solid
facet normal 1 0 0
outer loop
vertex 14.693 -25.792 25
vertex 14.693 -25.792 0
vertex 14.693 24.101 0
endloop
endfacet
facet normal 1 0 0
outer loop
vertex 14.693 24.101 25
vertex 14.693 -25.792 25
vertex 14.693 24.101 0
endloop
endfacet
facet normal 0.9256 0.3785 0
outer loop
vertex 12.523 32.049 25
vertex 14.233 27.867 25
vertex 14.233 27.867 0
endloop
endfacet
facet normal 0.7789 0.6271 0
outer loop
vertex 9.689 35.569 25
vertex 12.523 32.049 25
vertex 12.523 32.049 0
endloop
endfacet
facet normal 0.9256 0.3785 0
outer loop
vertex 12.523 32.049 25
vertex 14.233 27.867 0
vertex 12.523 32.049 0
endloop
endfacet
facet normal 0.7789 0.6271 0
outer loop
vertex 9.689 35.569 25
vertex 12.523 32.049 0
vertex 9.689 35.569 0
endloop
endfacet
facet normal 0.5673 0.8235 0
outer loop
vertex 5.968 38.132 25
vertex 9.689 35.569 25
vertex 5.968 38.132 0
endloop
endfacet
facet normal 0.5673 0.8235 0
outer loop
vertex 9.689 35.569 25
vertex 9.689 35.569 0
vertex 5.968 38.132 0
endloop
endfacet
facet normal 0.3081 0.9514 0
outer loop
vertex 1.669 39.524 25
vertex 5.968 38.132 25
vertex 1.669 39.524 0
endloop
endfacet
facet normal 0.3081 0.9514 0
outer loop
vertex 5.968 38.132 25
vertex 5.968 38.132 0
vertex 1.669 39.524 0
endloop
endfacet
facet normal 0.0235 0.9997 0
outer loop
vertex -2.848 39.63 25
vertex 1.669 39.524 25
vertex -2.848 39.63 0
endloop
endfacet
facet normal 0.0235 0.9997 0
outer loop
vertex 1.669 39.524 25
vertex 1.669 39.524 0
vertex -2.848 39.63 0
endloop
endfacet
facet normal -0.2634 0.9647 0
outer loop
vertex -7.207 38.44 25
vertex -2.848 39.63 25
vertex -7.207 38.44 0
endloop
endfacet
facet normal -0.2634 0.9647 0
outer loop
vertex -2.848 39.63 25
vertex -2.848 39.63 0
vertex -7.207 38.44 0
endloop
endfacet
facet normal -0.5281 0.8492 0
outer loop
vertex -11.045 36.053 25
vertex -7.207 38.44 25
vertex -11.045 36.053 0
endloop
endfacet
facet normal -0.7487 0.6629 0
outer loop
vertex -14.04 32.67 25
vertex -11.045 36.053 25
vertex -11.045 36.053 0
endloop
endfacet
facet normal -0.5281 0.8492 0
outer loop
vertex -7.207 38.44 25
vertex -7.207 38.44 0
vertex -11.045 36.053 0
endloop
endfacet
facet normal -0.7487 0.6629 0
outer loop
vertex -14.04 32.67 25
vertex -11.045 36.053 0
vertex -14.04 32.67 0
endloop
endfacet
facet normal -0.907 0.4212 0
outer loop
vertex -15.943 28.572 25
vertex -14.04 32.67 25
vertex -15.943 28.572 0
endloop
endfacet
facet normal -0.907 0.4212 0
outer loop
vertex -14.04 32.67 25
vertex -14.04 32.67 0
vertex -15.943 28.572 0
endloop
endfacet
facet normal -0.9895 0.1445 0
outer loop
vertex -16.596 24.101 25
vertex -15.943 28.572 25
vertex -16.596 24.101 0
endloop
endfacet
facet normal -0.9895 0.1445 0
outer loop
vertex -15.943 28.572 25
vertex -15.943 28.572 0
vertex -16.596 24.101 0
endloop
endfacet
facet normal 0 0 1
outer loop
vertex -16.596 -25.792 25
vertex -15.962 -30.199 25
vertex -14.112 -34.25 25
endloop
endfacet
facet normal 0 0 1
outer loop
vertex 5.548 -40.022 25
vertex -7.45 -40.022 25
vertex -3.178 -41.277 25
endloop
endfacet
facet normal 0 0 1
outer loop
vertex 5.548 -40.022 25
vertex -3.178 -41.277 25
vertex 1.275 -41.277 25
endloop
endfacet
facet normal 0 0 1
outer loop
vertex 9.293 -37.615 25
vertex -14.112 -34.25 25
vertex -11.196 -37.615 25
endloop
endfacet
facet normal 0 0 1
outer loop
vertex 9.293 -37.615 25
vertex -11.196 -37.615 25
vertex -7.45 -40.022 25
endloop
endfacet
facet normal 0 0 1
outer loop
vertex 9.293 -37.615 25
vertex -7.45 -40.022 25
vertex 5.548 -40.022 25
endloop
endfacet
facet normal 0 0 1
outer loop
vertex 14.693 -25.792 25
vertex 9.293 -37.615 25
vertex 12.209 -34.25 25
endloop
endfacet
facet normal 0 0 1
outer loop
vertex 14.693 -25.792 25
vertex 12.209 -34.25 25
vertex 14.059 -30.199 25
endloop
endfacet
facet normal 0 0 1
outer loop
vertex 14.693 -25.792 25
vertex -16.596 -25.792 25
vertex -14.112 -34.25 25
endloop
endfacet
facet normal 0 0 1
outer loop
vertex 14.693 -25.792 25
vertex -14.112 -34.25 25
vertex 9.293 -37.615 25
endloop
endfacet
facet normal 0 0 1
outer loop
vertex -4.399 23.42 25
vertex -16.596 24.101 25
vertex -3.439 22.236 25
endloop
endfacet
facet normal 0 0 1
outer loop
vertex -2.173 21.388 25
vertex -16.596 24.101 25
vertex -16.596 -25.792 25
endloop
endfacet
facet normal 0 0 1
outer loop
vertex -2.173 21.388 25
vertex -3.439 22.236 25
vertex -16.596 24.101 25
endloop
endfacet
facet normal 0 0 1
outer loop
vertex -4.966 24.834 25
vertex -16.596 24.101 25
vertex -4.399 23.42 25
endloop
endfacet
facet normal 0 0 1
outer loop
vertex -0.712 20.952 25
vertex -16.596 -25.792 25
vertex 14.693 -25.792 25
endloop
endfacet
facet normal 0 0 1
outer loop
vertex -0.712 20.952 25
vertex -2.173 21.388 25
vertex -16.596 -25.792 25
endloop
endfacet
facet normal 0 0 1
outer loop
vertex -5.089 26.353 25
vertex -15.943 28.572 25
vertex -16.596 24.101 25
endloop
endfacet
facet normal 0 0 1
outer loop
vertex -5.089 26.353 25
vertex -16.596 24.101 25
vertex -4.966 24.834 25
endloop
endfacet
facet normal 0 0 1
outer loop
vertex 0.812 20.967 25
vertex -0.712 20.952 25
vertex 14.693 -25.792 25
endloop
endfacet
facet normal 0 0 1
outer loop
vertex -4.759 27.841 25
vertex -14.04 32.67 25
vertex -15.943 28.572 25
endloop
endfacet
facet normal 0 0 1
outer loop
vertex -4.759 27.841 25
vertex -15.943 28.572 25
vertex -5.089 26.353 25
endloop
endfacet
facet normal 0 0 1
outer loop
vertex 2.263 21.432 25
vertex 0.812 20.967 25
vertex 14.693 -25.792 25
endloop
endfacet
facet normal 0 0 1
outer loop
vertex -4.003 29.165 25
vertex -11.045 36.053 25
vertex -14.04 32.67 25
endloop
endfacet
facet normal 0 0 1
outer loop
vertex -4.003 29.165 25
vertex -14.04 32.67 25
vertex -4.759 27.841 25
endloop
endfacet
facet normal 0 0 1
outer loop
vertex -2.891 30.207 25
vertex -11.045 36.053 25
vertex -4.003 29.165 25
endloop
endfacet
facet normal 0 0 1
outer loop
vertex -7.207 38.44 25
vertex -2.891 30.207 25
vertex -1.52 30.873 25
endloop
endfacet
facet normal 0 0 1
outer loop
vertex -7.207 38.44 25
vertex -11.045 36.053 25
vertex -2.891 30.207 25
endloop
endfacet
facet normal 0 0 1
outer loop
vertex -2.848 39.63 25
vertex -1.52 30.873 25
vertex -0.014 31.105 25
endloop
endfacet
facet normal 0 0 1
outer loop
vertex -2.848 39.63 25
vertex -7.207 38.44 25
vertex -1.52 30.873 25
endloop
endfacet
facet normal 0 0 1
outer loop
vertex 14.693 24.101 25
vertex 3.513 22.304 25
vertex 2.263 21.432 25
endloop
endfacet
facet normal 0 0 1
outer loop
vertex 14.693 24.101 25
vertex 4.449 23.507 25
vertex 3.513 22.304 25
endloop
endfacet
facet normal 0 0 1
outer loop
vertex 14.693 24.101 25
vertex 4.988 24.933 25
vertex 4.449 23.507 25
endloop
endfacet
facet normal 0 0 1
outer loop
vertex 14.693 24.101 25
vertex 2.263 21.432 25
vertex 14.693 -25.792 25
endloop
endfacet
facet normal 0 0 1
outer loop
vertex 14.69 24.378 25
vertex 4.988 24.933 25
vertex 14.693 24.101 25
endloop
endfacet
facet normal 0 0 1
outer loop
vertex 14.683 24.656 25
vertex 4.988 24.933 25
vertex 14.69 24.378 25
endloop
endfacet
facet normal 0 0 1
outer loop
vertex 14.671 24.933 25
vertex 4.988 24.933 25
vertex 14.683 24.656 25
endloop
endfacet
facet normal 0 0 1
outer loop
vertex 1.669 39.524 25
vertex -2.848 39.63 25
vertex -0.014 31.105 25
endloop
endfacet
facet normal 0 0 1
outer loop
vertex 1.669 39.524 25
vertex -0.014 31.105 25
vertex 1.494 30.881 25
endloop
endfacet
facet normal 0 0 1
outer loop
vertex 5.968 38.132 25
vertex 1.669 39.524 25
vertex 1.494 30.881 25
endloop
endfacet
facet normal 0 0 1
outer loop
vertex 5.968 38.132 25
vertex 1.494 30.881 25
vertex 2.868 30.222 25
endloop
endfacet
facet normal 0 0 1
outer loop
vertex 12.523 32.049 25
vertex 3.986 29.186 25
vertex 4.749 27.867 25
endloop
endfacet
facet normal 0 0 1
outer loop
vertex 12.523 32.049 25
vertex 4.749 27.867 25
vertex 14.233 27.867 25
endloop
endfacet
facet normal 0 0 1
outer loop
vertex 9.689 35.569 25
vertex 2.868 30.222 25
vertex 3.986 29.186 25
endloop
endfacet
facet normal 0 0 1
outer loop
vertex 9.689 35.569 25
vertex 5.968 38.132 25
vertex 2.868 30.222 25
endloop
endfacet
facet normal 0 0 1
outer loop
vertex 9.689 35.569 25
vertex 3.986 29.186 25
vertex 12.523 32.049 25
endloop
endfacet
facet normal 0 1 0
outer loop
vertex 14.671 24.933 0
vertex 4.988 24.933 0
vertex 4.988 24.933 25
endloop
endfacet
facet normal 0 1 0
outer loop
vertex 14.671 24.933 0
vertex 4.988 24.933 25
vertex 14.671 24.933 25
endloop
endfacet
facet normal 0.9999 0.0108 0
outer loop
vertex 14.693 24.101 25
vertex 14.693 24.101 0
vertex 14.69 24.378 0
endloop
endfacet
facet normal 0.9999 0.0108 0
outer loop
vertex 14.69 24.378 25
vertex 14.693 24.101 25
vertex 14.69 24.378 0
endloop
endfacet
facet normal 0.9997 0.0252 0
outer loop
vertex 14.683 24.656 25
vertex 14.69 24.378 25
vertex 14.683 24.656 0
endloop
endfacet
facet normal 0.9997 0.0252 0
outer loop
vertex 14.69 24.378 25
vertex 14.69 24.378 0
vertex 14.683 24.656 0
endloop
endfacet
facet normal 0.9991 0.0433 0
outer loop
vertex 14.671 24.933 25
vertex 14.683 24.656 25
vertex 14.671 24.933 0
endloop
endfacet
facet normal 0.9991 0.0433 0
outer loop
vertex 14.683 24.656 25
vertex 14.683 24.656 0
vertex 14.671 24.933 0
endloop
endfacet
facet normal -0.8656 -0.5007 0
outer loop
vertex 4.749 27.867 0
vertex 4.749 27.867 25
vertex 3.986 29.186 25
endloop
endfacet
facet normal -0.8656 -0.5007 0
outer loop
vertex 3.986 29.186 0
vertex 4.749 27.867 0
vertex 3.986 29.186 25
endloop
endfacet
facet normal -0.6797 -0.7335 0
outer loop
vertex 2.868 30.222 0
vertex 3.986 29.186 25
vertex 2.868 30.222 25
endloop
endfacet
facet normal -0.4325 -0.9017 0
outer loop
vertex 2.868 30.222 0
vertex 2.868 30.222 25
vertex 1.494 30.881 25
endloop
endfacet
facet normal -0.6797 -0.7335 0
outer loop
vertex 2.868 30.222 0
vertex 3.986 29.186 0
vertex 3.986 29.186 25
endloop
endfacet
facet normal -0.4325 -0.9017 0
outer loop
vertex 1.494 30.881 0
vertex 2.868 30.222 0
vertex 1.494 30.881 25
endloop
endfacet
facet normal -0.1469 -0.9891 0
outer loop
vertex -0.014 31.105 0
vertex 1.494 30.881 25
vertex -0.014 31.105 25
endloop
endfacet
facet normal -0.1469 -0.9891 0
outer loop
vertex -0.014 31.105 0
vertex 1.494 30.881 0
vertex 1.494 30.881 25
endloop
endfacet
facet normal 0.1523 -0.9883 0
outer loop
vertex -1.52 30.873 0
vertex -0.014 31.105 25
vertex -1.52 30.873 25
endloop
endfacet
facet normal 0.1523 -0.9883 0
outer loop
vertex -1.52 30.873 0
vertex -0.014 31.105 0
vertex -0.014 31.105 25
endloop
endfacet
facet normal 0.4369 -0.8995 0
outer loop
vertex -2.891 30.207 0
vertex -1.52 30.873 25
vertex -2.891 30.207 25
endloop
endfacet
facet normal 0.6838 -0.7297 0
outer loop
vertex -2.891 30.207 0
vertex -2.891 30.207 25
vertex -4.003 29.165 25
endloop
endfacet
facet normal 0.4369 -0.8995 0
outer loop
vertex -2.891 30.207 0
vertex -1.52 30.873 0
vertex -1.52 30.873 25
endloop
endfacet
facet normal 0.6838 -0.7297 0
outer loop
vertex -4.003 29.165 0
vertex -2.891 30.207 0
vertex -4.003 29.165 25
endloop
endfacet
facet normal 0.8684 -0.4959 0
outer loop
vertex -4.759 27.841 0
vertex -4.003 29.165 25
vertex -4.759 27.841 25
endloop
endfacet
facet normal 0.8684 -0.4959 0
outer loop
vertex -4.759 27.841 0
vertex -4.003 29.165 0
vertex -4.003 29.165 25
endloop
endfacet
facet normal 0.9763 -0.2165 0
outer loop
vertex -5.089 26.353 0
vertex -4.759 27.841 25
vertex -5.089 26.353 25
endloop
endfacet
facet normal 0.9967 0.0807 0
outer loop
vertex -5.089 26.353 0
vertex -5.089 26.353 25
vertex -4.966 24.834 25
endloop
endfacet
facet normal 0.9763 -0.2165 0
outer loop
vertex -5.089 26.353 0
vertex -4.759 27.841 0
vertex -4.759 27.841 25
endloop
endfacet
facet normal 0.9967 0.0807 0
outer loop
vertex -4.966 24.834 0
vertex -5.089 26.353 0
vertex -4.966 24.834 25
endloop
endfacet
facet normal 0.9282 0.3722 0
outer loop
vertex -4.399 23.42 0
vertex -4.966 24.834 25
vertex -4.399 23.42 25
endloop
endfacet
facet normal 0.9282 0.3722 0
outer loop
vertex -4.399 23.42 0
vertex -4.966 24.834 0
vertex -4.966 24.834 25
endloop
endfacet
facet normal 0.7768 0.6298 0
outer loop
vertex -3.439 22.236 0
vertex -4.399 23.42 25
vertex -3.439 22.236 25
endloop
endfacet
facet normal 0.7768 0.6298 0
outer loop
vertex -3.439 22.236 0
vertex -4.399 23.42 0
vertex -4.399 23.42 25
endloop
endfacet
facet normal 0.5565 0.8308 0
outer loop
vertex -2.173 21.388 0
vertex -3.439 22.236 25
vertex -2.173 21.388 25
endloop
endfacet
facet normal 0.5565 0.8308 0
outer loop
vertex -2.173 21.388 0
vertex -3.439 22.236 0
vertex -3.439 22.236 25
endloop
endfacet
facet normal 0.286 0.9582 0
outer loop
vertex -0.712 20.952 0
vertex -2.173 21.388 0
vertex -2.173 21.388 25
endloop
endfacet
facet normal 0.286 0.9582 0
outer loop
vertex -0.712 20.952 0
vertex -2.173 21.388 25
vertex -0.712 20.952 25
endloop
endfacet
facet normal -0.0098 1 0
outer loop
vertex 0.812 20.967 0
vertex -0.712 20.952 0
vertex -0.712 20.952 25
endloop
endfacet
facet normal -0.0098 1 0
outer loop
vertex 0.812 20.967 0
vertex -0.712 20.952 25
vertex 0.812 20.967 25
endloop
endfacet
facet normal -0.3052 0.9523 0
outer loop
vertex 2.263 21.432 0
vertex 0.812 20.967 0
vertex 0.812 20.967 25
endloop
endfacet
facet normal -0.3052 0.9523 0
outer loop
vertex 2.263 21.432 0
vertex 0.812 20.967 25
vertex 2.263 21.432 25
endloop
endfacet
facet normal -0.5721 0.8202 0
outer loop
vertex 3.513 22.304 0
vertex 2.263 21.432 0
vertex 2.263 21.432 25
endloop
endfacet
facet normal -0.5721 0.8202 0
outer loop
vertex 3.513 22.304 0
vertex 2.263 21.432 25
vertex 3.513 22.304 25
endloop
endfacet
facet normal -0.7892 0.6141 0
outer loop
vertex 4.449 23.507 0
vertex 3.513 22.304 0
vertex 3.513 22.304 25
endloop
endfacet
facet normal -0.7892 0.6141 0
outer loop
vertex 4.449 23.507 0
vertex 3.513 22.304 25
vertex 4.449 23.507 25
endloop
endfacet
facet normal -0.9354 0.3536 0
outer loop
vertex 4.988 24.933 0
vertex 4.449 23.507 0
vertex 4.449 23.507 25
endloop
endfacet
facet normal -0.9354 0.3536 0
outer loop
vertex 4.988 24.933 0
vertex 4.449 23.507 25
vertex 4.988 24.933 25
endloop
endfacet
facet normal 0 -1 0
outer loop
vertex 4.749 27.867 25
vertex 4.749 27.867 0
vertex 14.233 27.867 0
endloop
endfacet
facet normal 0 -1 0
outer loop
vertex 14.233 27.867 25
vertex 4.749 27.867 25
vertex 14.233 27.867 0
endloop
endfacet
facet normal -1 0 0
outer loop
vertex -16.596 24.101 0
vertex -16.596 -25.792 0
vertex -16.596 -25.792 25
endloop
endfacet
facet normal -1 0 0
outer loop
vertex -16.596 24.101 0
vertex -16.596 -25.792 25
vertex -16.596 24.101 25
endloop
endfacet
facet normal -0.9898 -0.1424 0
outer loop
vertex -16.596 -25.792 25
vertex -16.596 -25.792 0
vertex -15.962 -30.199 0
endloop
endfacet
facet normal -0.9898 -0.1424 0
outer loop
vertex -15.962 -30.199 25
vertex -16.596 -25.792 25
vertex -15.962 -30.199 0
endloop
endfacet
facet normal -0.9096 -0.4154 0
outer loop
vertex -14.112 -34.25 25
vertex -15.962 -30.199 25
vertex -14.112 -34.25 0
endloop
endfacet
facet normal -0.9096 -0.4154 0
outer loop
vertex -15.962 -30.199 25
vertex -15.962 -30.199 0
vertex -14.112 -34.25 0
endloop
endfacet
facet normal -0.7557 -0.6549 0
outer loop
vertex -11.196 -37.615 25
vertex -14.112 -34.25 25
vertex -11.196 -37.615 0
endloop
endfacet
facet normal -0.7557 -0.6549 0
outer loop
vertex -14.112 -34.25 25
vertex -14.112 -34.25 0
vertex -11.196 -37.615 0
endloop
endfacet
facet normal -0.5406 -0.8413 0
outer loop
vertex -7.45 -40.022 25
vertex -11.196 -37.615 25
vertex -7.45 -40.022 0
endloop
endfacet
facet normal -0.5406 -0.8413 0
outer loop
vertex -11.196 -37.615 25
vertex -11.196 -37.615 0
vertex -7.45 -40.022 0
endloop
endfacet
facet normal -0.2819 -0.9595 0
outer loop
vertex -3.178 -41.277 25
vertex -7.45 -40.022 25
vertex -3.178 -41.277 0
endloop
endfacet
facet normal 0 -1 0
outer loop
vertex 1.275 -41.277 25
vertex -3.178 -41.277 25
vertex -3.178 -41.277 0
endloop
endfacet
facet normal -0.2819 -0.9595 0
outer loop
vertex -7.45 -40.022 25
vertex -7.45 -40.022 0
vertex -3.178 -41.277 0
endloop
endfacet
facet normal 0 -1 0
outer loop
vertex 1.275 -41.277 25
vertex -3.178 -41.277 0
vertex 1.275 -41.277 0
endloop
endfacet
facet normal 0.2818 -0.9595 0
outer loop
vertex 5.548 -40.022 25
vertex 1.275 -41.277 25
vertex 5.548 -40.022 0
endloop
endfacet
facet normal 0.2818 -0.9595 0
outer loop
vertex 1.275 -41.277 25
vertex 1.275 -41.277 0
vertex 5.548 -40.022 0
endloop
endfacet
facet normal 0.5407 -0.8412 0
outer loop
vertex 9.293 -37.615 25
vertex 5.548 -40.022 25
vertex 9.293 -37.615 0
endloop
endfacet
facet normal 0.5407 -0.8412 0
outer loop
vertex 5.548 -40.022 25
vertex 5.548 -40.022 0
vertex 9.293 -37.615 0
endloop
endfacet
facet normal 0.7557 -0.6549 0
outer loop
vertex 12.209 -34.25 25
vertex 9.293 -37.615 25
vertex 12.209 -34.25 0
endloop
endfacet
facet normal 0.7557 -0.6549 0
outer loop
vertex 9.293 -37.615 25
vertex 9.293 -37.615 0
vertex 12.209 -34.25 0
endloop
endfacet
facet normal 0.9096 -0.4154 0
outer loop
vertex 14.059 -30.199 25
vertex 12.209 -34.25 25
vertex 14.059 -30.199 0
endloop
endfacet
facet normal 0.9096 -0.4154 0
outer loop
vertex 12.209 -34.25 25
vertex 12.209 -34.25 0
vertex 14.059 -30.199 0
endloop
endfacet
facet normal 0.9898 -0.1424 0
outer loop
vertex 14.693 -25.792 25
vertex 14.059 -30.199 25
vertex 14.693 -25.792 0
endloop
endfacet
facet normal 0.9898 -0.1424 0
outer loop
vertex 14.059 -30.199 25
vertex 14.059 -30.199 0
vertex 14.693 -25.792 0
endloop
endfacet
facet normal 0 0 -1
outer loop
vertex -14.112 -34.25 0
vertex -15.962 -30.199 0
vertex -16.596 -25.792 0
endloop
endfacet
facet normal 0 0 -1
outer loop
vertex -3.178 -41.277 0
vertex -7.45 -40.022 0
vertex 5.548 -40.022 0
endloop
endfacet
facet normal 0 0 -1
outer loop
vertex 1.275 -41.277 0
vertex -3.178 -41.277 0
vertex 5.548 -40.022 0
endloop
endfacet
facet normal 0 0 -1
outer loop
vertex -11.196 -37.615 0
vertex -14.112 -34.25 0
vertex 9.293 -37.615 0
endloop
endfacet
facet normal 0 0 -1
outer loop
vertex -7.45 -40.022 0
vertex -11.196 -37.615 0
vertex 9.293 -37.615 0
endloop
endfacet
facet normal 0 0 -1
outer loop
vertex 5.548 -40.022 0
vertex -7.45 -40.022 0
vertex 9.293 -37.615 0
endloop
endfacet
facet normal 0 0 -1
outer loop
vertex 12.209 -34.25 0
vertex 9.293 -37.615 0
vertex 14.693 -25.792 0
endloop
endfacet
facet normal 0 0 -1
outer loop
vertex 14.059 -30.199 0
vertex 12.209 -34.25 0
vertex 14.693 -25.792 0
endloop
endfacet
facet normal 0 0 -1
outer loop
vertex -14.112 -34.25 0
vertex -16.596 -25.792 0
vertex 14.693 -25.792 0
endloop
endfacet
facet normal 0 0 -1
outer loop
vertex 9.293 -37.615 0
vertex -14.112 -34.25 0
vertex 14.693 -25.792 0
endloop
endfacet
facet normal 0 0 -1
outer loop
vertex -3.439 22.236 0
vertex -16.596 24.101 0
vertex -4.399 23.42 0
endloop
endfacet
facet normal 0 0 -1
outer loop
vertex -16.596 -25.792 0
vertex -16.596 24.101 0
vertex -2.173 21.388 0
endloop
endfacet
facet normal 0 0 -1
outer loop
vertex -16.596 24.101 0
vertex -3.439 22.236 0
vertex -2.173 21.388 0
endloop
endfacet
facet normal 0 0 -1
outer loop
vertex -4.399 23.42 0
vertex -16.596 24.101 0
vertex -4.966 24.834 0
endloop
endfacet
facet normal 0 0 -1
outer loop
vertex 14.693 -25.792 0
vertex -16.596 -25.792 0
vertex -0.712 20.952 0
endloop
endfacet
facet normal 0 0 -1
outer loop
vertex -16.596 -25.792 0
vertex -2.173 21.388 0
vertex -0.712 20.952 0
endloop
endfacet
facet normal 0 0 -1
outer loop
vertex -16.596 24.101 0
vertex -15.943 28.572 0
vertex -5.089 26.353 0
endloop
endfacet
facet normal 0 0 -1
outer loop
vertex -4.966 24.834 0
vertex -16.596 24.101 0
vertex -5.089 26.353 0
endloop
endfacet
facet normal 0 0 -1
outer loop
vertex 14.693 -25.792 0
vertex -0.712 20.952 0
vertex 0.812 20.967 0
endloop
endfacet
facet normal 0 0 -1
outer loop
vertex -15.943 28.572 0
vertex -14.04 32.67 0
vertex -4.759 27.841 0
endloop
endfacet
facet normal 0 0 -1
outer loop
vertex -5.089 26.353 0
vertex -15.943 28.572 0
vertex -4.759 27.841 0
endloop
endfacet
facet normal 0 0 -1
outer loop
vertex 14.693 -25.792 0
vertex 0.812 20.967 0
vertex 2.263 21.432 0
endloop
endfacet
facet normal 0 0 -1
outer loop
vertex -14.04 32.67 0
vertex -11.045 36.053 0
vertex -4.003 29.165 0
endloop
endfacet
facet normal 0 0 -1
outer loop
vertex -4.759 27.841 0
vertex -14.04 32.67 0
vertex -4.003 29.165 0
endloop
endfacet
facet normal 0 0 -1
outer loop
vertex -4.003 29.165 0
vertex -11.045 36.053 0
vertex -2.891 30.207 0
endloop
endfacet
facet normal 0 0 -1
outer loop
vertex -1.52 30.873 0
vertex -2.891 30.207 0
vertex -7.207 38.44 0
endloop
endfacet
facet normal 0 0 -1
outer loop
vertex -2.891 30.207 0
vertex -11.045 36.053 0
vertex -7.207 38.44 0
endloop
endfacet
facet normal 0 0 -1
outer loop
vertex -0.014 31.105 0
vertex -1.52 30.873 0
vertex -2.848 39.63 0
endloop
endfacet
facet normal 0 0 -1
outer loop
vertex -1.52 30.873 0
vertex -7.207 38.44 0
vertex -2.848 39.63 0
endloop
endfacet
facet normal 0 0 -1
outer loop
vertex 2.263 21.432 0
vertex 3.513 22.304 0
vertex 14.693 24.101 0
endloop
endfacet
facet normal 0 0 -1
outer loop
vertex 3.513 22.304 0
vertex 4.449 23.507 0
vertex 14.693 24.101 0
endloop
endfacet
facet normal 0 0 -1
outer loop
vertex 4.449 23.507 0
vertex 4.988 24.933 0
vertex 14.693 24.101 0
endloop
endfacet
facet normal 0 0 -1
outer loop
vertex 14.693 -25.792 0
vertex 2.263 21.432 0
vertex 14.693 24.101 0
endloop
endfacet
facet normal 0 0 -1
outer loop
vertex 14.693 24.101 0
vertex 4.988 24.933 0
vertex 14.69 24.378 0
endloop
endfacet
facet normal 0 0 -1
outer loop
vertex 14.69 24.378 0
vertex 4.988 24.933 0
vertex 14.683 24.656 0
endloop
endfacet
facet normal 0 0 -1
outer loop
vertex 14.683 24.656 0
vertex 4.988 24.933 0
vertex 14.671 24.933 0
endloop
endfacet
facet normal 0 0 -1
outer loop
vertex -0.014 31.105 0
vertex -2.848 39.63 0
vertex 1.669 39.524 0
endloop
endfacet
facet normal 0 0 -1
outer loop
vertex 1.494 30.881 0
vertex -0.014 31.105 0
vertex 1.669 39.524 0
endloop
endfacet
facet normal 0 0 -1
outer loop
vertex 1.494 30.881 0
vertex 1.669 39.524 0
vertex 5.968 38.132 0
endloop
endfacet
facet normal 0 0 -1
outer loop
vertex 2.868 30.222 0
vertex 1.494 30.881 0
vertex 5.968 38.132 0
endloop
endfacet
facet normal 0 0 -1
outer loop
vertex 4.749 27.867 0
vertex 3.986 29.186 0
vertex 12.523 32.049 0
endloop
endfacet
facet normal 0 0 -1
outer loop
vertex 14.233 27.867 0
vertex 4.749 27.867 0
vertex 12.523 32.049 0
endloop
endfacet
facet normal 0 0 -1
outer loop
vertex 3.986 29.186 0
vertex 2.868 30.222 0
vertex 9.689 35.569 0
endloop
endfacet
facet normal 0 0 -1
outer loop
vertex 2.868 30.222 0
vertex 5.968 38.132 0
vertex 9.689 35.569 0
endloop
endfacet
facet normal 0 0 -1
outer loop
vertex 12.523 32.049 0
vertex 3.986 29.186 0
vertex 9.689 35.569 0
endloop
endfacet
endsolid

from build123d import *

# Parameters (mm, degrees)
F0_W     = 31.28859
F0_H     = 49.892618
F1_DEPTH = 25
F2_R     = 5.101278
F3_DEPTH = 25
F4_W     = 23.469856
F4_H     = 2.933731
F5_DEPTH = 25


with BuildPart() as f1:
    # F0 (on Top) → F1 (new body)
    with BuildSketch(Plane.XY):
        with BuildLine():
            ThreePointArc((14.692953, 24.100671), (-0.951342, 39.744966), (-16.595637, 24.100671))
            Line((-16.595637, 24.100671), (14.692953, 24.100671))
        make_face()
        with Locations((-0.951342, -0.845638)):
            Rectangle(F0_W, F0_H)
        with BuildLine():
            Line((14.692953, -25.791947), (-16.595637, -25.791947))
            ThreePointArc((-16.595637, -25.791947), (-0.951342, -41.436242), (14.692953, -25.791947))
        make_face()
    extrude(amount=F1_DEPTH)

    # F2 (on Top) → F3 (cut)
    with BuildSketch(Plane.XY):
        with Locations((0, 26.003355)):
            Circle(F2_R)
    extrude(amount=F3_DEPTH, mode=Mode.SUBTRACT)

    # F4 (on face) → F5 (cut)
    with BuildSketch(Plane(origin=(0, 0, 0), x_dir=(1, 0, 0), z_dir=(0, 0, -1))):
        with Locations((14.623049, -26.399825)):
            Rectangle(F4_W, F4_H)
    extrude(amount=-F5_DEPTH, mode=Mode.SUBTRACT)


solid = f1.part
